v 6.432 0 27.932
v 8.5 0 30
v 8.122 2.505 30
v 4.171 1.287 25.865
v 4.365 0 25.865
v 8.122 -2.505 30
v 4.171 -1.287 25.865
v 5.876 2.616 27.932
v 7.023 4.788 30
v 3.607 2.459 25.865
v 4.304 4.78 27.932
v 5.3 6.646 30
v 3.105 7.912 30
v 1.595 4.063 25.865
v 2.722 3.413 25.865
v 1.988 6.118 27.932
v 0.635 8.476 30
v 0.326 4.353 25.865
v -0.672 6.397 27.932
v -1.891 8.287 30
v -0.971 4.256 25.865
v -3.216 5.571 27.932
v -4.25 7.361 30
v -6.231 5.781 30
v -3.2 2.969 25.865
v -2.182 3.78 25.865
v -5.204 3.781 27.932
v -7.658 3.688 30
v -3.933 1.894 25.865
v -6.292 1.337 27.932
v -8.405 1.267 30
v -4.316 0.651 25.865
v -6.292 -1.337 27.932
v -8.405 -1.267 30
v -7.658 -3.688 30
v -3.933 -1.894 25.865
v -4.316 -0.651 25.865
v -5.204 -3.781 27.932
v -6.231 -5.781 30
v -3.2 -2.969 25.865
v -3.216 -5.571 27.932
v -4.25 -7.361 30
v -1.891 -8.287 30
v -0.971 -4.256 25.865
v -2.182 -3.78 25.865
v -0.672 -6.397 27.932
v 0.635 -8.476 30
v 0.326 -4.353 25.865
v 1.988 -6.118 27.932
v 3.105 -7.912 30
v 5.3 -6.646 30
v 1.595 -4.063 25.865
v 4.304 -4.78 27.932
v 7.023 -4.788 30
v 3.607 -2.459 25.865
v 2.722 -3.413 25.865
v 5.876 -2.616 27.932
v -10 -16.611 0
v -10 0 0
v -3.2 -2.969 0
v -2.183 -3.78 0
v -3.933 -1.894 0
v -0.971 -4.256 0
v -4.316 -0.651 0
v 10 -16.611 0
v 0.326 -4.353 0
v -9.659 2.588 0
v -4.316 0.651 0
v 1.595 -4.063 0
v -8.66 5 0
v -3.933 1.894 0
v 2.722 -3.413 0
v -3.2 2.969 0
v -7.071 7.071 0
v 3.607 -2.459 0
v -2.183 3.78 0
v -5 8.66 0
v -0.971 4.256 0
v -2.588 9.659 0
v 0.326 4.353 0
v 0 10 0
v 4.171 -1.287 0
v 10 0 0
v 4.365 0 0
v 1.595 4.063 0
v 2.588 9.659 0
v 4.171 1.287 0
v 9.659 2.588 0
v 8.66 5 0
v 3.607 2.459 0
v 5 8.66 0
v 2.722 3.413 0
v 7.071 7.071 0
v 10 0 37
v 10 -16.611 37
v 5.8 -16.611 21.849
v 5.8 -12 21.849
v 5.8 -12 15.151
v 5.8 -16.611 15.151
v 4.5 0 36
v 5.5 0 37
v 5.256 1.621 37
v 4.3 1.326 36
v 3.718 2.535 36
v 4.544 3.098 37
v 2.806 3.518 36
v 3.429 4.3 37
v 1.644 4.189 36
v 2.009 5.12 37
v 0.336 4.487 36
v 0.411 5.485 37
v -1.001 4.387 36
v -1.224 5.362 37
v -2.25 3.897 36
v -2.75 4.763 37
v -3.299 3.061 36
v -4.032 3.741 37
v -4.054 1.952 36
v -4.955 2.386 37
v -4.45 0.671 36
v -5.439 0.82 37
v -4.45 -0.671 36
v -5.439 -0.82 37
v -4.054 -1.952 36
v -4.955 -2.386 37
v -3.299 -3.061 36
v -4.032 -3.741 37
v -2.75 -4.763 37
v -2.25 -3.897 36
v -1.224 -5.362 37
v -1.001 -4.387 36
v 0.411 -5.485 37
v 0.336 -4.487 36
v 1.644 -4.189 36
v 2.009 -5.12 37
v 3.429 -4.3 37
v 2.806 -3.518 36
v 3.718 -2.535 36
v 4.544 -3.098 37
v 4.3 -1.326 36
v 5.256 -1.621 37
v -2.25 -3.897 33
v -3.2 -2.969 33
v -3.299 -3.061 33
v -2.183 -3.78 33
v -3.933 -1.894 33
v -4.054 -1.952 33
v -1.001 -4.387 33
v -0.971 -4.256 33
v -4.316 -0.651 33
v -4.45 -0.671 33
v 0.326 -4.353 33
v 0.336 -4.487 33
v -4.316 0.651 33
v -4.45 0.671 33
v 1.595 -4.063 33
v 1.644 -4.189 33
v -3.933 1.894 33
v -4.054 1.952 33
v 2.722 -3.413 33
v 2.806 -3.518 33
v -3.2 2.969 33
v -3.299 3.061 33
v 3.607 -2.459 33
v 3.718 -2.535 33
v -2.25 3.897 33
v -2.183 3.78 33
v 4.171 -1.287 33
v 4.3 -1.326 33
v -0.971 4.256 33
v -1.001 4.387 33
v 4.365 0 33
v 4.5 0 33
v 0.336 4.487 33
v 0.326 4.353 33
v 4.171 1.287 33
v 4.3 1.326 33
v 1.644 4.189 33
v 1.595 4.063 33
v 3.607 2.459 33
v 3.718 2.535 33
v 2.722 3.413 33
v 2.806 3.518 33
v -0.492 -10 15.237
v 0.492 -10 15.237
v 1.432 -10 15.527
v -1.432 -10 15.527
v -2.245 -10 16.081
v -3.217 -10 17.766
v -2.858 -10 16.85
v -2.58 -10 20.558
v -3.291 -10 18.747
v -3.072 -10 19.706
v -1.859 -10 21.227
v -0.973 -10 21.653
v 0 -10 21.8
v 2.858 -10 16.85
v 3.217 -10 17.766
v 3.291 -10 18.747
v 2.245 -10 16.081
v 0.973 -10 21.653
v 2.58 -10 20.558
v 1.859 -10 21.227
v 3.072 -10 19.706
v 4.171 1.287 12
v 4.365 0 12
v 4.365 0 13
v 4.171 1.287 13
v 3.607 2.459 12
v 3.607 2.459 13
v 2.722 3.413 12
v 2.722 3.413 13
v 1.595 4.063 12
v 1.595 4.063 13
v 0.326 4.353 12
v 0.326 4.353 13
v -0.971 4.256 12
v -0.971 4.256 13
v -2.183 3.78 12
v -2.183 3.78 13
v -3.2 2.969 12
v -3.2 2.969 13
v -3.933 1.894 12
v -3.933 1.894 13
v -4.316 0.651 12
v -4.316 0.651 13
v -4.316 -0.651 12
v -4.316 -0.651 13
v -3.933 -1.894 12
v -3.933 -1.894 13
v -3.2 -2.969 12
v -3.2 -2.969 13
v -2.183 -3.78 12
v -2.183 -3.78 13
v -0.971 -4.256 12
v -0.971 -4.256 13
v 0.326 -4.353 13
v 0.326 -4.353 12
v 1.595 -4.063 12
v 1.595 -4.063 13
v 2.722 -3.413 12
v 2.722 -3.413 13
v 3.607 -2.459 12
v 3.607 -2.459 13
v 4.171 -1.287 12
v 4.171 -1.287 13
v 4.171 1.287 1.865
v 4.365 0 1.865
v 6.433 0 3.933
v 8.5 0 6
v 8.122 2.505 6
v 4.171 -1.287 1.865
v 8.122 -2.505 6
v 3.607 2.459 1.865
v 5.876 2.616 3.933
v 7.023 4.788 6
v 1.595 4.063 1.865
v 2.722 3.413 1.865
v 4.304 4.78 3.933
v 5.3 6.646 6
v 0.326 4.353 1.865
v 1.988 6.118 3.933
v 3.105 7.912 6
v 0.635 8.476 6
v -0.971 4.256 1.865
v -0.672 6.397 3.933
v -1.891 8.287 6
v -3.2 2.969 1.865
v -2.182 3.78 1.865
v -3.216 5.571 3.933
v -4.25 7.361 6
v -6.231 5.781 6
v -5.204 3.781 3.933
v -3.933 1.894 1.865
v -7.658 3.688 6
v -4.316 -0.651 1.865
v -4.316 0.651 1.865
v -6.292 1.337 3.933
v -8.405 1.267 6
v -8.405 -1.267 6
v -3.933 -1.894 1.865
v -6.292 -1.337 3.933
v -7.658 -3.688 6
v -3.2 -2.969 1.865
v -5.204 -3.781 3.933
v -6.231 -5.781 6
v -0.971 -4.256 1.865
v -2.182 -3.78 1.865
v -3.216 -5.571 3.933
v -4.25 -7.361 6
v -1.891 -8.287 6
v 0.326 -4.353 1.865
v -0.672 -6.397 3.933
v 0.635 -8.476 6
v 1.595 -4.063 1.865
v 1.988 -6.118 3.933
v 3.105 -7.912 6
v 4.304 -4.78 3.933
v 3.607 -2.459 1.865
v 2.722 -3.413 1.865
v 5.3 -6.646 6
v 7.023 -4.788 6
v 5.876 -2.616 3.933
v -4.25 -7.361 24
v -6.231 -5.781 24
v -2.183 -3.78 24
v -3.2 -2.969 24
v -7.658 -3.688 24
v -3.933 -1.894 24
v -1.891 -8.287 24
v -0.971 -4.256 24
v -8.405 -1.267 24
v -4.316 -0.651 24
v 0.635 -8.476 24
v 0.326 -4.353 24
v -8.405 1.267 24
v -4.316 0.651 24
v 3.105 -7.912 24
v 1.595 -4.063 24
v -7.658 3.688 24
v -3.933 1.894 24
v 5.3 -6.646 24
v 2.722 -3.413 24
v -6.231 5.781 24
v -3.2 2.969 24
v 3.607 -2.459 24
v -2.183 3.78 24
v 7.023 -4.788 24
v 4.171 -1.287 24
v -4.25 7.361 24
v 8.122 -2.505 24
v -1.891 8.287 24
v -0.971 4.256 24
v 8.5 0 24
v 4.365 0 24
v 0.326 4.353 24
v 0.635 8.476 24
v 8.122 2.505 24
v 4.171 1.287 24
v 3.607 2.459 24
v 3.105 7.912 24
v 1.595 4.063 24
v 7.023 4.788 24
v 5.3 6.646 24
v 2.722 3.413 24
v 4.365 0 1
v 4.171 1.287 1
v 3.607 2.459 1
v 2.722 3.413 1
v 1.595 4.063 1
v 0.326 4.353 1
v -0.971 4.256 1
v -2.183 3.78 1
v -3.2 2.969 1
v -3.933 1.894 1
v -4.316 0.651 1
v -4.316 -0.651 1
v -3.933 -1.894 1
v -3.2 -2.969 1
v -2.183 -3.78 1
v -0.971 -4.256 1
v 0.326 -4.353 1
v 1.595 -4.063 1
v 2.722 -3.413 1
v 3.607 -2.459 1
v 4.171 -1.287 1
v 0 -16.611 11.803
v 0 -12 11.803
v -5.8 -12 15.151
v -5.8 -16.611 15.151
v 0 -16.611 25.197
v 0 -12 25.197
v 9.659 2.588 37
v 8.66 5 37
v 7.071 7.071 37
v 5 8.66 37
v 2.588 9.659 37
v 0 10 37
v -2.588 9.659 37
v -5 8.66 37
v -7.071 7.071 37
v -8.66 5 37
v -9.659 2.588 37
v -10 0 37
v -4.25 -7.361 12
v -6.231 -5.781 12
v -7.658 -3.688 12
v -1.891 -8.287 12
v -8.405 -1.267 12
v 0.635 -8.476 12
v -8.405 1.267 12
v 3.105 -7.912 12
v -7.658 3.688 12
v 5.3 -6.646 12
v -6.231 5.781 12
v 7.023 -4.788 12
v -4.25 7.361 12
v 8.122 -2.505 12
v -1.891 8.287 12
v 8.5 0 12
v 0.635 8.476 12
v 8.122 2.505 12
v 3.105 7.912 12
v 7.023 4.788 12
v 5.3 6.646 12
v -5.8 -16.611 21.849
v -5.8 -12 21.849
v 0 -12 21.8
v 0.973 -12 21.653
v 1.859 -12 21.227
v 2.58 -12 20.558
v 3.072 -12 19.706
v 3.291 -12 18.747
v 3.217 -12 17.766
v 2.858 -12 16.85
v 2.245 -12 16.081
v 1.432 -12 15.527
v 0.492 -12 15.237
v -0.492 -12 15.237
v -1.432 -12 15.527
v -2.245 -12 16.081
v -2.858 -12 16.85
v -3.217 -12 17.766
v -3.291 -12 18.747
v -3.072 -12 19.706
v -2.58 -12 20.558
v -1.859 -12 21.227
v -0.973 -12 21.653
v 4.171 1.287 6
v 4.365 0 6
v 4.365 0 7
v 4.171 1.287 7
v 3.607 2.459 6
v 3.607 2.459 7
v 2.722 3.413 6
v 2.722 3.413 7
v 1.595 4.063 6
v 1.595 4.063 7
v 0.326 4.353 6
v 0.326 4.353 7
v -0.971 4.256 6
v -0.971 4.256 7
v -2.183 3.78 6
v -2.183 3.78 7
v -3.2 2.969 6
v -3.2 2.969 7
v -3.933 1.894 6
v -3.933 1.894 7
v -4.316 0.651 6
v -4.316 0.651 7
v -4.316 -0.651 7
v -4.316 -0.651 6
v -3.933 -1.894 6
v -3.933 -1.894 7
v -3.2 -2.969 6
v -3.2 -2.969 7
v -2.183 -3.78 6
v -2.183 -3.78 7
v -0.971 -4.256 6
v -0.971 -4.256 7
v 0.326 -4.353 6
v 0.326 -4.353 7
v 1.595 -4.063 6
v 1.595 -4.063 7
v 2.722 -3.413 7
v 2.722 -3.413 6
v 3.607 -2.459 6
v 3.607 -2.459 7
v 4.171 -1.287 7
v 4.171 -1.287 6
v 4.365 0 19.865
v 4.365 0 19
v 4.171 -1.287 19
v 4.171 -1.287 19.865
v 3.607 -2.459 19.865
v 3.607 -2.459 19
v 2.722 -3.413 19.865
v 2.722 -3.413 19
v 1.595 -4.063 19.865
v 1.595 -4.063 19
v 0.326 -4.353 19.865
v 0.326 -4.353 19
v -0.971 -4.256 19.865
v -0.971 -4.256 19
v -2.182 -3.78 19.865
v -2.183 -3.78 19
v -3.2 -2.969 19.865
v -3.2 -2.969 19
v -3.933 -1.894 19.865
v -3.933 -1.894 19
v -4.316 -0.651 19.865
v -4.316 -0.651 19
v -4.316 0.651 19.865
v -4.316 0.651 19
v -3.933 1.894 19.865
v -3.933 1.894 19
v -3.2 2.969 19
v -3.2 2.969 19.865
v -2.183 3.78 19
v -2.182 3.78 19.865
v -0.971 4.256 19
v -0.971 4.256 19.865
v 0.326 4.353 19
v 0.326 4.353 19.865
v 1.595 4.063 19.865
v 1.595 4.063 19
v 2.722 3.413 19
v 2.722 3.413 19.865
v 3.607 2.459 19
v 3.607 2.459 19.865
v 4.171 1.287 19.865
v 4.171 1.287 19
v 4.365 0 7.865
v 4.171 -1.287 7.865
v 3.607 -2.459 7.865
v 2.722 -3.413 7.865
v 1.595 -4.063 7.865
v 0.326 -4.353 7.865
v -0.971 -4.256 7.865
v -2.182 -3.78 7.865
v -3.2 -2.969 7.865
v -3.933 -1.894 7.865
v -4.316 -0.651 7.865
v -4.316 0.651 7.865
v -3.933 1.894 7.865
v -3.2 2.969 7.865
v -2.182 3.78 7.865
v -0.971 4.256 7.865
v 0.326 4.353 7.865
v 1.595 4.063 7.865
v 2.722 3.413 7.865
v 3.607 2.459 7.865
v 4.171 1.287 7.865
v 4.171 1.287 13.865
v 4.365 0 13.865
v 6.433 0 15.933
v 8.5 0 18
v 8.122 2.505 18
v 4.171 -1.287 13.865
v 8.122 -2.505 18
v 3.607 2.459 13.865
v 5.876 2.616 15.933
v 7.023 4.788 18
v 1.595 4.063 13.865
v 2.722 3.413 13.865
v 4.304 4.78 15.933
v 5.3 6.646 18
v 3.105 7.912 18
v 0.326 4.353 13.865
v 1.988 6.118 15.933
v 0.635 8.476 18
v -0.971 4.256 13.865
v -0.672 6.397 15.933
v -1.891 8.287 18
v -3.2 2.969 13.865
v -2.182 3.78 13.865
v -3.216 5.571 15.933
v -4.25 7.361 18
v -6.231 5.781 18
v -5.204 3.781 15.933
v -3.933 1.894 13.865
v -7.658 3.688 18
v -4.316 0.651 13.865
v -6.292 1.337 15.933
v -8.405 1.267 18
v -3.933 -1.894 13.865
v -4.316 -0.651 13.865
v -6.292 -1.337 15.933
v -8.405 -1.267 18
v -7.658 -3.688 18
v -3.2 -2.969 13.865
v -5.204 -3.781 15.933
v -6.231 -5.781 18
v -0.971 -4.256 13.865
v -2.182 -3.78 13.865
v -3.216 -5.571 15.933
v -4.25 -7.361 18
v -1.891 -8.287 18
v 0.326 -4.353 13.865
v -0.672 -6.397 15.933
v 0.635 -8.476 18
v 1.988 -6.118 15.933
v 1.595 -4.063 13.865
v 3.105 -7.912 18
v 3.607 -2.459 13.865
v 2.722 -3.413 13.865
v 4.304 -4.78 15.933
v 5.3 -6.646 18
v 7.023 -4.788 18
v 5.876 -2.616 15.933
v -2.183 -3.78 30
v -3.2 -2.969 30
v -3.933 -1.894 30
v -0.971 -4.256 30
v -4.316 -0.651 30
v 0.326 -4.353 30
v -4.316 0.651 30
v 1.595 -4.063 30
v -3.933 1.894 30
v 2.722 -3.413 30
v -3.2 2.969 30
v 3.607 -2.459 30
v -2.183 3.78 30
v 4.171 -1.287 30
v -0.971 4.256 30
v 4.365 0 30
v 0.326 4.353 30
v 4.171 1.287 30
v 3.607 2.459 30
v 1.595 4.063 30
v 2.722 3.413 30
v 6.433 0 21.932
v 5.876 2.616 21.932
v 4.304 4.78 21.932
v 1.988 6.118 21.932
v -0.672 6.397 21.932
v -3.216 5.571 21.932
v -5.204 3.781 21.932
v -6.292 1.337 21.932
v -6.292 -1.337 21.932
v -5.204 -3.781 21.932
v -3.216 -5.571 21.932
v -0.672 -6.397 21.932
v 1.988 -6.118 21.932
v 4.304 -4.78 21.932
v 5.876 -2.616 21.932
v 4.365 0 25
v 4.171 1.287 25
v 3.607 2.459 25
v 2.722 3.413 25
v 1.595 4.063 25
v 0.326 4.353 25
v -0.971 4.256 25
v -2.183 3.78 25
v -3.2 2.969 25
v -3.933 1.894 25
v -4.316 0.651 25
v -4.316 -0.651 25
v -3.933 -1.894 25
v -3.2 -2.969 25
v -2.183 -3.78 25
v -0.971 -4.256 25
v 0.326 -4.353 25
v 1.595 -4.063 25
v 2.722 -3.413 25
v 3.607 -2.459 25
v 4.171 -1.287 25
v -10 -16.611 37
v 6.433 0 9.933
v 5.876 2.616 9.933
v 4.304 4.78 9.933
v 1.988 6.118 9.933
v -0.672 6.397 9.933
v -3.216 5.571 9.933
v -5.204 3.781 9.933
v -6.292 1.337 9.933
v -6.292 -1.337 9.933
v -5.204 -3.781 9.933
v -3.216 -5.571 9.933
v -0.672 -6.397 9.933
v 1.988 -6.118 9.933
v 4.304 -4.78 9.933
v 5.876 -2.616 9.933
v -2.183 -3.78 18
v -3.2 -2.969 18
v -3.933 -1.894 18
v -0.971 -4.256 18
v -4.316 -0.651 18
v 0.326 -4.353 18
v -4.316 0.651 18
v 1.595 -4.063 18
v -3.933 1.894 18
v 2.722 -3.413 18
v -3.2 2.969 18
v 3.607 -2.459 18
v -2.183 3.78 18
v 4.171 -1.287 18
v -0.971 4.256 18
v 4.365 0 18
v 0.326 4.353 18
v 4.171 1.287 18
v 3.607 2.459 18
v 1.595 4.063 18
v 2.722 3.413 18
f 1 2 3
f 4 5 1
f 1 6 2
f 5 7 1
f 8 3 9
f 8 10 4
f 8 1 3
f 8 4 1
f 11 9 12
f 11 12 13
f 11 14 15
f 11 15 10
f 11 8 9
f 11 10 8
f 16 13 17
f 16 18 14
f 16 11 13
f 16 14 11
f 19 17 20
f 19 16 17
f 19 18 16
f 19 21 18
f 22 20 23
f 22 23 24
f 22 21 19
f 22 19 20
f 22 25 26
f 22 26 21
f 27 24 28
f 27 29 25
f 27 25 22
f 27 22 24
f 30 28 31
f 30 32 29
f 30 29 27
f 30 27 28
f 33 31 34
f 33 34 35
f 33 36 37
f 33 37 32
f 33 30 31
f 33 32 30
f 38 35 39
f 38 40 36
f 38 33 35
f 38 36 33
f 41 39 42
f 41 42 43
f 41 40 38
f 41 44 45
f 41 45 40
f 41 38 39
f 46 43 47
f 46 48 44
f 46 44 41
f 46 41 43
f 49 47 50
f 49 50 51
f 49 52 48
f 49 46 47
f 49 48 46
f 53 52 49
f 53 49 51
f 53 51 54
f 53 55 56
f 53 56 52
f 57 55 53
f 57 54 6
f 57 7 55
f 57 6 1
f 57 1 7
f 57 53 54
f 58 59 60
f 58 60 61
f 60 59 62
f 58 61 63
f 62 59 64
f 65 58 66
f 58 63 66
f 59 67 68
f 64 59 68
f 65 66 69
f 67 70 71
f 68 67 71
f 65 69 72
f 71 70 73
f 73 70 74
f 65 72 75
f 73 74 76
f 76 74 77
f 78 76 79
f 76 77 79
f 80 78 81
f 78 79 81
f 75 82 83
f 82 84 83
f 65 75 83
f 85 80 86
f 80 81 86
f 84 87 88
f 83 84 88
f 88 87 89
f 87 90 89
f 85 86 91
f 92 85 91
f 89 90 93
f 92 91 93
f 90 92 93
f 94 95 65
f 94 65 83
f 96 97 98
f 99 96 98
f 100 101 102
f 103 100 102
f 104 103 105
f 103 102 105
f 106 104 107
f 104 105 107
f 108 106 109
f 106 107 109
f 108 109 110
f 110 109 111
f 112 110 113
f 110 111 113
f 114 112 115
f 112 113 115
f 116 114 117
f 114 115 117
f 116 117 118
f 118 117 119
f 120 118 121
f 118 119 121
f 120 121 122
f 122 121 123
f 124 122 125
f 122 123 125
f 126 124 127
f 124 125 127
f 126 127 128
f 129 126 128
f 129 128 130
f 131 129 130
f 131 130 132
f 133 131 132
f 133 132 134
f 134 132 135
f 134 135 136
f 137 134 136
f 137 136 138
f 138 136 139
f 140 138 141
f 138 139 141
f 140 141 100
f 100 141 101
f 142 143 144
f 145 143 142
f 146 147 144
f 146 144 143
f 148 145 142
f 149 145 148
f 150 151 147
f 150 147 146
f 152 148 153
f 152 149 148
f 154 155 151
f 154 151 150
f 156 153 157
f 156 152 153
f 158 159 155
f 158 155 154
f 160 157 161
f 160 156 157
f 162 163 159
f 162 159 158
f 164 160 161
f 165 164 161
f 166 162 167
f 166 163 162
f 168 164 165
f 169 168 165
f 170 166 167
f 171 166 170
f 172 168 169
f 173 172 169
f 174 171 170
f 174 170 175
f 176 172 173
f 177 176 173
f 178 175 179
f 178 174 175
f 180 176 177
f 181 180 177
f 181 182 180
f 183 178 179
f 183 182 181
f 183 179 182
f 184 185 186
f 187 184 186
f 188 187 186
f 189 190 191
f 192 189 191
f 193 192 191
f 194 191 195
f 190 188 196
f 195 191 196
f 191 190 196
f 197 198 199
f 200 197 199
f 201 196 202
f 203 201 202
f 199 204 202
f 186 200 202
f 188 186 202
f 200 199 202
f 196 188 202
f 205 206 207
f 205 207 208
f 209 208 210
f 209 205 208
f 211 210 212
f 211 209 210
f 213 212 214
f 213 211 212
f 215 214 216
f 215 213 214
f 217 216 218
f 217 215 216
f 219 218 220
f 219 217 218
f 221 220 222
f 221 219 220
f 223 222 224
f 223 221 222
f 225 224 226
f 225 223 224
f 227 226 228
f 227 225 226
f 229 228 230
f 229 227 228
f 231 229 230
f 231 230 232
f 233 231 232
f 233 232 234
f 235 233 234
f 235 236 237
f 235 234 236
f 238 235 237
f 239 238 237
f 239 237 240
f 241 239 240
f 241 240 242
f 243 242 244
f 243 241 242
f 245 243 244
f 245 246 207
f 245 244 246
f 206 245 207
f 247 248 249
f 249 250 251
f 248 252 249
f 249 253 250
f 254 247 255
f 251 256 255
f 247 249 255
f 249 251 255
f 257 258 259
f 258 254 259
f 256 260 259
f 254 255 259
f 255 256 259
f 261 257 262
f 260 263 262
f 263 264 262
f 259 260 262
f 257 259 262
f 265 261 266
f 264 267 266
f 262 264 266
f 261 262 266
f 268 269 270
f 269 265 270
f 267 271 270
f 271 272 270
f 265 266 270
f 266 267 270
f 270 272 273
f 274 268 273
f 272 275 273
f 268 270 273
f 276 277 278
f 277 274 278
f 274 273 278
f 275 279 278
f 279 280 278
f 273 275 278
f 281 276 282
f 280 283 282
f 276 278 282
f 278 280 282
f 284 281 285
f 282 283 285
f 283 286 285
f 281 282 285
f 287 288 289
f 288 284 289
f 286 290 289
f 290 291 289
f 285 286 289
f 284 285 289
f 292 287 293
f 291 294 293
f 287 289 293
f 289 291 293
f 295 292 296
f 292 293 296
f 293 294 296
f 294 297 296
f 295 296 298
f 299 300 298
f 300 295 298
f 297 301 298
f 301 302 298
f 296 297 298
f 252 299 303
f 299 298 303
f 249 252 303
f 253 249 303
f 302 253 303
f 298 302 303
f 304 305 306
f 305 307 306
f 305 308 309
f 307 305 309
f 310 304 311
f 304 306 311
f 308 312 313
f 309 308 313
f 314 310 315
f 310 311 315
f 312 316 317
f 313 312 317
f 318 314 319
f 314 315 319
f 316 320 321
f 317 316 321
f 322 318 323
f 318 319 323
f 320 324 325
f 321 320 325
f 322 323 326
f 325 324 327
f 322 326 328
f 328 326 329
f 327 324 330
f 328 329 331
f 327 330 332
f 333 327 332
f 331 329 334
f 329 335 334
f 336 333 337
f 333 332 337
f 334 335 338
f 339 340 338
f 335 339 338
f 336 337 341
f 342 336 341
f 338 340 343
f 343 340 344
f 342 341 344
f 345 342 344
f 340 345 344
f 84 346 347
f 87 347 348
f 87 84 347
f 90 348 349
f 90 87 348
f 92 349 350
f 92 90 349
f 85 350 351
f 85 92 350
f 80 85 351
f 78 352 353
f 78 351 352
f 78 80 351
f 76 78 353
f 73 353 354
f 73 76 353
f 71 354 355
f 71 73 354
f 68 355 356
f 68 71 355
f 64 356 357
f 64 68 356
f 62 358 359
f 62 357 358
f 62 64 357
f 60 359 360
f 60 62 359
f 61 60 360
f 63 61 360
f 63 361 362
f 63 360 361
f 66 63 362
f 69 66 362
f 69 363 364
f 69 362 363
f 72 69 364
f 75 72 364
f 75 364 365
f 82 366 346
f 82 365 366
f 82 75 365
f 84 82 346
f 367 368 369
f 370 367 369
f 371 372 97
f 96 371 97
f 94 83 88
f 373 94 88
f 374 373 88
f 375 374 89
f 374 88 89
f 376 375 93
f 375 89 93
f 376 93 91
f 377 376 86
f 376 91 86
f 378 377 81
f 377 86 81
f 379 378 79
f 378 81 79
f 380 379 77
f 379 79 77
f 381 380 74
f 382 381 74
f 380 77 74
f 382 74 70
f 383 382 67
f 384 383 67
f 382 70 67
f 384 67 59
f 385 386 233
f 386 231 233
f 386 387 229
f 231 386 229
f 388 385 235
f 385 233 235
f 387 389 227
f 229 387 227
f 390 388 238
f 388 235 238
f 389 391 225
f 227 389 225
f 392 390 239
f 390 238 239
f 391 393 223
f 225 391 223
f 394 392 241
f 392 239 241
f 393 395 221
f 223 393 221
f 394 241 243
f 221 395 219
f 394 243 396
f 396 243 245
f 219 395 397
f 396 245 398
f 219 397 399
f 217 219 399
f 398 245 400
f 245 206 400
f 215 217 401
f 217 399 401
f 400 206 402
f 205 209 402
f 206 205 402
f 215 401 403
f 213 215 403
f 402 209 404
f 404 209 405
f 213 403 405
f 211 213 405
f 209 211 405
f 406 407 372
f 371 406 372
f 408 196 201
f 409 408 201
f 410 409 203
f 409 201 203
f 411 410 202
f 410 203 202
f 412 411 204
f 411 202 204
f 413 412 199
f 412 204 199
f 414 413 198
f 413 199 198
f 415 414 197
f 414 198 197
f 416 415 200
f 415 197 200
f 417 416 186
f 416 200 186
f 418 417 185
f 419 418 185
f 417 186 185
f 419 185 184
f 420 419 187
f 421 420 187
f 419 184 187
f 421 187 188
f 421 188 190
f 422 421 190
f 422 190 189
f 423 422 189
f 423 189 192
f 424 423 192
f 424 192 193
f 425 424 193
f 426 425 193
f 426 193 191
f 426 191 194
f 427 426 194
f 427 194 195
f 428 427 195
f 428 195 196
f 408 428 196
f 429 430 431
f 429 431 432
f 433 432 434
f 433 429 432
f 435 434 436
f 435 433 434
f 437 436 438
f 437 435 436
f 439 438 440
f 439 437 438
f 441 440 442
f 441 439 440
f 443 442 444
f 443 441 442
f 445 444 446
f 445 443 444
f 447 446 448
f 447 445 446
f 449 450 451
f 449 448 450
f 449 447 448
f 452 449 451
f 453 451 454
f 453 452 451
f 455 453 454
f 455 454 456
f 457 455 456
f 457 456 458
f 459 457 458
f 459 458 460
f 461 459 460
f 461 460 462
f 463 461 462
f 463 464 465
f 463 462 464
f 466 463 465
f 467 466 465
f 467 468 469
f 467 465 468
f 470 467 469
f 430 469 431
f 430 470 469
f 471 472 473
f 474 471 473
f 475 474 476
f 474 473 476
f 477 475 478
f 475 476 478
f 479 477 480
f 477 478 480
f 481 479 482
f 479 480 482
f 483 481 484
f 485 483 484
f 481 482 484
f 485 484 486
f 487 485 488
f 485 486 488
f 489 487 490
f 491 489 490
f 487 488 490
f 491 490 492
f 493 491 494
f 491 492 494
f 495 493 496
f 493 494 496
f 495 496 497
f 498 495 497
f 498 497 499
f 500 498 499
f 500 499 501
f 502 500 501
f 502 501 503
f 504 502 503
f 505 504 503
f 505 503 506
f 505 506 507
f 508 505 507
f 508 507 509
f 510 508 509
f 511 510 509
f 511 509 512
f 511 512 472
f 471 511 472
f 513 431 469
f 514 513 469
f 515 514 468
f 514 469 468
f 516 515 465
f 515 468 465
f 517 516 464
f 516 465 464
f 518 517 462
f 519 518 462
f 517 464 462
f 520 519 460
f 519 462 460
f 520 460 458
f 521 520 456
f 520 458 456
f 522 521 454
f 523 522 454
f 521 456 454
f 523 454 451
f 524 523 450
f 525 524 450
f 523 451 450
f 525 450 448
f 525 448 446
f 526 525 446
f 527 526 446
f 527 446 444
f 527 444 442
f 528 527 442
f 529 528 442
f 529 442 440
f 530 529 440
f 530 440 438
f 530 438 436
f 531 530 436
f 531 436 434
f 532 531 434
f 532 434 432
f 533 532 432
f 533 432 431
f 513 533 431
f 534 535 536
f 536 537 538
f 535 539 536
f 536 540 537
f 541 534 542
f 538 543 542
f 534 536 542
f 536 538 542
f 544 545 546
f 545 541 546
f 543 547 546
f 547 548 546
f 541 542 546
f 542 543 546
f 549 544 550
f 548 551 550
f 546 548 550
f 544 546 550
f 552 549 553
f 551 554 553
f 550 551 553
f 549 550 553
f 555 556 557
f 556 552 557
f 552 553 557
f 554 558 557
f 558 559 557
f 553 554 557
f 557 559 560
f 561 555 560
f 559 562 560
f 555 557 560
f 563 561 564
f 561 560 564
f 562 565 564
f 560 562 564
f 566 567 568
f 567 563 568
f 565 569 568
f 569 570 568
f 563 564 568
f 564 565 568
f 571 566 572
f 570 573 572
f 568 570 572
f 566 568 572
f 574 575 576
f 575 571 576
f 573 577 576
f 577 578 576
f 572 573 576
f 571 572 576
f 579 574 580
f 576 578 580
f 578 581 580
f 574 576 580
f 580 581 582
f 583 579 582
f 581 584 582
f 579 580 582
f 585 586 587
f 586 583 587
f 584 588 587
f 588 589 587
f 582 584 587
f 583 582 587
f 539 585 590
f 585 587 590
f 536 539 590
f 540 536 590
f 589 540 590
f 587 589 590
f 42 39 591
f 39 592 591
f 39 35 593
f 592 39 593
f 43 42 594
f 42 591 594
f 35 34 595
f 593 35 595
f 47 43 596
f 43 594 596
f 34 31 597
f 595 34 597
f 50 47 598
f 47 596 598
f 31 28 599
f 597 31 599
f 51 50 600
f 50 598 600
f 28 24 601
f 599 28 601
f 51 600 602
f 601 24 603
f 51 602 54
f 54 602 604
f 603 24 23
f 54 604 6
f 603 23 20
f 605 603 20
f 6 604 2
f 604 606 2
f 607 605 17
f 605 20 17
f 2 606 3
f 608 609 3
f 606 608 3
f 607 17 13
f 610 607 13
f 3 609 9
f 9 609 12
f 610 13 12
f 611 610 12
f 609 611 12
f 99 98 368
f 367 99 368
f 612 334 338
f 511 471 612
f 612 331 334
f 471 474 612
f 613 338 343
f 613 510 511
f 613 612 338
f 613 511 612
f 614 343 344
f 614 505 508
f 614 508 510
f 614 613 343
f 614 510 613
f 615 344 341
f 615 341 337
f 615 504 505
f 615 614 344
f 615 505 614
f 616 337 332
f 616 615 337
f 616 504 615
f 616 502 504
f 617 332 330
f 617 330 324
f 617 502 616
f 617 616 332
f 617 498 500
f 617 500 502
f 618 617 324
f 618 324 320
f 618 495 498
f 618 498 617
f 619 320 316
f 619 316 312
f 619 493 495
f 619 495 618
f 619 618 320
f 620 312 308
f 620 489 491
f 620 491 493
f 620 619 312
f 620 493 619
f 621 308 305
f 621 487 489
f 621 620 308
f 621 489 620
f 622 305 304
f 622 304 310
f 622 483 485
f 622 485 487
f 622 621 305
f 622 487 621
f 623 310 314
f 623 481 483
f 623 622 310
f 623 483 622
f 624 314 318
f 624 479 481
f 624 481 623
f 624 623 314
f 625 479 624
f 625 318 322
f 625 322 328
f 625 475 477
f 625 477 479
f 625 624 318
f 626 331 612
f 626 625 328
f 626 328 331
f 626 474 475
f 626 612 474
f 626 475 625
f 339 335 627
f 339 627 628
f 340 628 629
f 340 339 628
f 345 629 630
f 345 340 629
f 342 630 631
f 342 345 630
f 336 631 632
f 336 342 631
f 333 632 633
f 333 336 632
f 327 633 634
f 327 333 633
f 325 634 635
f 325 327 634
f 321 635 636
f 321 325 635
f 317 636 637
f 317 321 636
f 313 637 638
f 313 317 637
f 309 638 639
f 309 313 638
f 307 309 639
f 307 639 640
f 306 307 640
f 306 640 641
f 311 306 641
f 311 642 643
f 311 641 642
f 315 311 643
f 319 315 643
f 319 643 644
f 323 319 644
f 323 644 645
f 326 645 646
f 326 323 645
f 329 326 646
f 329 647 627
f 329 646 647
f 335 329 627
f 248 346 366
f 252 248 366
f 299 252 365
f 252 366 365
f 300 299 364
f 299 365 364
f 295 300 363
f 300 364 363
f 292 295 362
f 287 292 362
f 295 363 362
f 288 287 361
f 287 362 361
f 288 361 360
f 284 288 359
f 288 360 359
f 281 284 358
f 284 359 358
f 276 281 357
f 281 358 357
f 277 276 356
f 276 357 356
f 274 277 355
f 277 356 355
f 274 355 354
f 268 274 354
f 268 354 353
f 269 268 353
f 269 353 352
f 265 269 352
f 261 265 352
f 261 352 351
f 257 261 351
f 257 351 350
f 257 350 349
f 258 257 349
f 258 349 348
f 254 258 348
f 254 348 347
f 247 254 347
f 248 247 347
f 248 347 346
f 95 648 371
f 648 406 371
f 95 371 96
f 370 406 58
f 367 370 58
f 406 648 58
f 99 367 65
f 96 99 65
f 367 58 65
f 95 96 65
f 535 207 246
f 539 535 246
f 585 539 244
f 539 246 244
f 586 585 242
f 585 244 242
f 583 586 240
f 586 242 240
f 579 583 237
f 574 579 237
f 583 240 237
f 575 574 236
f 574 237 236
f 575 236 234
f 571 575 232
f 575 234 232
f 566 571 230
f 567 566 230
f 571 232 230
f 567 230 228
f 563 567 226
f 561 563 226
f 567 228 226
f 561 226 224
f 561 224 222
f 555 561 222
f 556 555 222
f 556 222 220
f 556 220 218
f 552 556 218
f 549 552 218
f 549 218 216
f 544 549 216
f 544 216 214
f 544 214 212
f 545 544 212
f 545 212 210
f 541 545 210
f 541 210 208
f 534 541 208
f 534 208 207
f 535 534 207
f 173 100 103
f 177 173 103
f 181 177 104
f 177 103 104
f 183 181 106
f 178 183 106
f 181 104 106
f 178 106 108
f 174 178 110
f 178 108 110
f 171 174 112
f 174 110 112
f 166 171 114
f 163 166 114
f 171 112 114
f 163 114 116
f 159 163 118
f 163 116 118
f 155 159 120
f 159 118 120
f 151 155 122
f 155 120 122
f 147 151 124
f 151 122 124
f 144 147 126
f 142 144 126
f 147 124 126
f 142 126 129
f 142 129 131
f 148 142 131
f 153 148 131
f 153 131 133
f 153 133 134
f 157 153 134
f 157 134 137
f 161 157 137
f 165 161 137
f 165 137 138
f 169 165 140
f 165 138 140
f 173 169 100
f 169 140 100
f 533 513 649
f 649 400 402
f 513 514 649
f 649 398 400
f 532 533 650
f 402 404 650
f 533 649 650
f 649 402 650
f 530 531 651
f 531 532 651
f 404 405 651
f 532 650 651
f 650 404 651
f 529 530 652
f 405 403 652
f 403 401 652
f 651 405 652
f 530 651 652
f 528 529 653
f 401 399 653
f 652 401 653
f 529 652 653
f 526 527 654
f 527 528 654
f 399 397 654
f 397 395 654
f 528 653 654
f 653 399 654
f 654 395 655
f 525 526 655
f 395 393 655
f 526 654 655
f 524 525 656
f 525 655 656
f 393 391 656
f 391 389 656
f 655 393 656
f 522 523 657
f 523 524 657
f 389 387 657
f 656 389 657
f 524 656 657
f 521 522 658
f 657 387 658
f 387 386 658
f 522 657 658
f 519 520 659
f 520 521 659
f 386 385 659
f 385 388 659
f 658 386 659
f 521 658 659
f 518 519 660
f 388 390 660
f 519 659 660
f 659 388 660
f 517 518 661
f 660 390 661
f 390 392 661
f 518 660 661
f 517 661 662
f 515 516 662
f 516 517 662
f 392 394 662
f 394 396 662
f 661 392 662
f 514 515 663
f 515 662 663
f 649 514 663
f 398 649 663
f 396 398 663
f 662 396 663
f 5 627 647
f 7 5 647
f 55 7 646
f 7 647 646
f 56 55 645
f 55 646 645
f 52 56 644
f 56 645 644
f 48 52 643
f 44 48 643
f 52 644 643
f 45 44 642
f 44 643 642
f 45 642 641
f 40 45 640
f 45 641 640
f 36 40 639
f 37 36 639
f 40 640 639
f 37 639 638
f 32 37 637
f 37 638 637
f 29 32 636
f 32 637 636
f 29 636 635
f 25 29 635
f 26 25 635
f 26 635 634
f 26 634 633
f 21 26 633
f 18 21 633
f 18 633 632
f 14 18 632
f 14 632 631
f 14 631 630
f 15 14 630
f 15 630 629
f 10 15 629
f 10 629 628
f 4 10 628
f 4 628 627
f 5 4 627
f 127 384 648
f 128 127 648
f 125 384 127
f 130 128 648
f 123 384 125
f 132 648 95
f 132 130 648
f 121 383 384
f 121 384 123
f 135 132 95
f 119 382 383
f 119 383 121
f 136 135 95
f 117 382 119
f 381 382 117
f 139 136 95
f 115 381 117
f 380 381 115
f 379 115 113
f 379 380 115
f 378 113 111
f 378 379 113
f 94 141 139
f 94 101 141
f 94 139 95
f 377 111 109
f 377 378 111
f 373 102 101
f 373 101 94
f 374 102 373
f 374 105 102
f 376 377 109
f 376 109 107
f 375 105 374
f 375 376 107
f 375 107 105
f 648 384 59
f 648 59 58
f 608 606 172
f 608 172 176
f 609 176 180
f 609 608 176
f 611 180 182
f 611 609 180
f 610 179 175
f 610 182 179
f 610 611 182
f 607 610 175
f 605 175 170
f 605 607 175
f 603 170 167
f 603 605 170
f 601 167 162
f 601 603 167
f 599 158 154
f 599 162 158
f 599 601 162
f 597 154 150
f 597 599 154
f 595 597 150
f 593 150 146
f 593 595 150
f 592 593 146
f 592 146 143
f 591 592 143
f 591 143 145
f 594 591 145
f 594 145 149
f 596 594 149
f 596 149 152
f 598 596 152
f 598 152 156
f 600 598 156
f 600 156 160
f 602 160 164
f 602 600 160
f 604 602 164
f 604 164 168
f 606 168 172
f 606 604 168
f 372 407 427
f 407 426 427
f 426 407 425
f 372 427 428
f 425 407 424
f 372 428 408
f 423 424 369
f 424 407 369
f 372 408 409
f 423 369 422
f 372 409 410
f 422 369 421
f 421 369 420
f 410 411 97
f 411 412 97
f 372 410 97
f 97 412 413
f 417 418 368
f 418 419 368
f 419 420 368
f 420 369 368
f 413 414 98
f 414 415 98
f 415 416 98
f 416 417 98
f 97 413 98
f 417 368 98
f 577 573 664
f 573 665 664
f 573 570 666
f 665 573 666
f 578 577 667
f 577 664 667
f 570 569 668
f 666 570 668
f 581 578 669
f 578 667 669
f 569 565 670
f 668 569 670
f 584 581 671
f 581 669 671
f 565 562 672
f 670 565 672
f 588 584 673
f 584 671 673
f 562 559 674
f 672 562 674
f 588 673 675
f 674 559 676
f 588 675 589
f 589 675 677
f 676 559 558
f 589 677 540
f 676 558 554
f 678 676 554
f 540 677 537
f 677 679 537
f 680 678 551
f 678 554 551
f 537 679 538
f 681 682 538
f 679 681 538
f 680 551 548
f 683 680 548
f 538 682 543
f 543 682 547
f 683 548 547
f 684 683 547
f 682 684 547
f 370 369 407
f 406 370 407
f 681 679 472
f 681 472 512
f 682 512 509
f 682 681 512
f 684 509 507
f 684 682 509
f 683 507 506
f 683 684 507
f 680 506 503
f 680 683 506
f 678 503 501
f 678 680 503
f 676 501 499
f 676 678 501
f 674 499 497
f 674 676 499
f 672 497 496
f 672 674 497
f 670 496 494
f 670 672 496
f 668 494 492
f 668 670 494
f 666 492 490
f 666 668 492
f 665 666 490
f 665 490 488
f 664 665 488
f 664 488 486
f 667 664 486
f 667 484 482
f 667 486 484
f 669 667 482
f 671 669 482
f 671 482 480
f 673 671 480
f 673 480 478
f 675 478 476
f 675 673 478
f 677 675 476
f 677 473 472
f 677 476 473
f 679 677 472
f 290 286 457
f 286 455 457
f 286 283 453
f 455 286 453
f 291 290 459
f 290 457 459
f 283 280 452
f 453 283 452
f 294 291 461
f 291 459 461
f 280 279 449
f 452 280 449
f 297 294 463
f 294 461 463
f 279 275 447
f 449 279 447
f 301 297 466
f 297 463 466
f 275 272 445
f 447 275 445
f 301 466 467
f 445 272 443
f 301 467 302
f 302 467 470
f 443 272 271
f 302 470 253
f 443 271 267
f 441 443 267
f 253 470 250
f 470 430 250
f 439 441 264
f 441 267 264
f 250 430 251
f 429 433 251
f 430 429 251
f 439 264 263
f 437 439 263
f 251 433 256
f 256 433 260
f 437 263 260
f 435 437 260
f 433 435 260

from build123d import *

# Parameters (mm, degrees)
CROQUIS1_R              = 10
CROQUIS1_R_2            = 4.365
SALIENTE_EXTRUIR1_DEPTH = 37
CORTAR_EXTRUIR1_START   = 1
CROQUIS1_3_R            = 8.5
CORTAR_EXTRUIR1_DEPTH   = 5
CORTAR_EXTRUIR2_START   = 7
CROQUIS1_4_R            = 8.5
CORTAR_EXTRUIR2_DEPTH   = 5
CORTAR_EXTRUIR3_START   = 13
CROQUIS1_5_R            = 8.5
CORTAR_EXTRUIR3_DEPTH   = 5
CORTAR_EXTRUIR4_START   = 19
CROQUIS1_6_R            = 8.5
CORTAR_EXTRUIR4_DEPTH   = 5
CORTAR_EXTRUIR5_START   = 25
CROQUIS1_7_R            = 8.5
CORTAR_EXTRUIR5_DEPTH   = 5
CHAFL_N1_SIZE           = 5
CORTAR_EXTRUIR6_START   = 37
CROQUIS4_R              = 4.5
CORTAR_EXTRUIR6_DEPTH   = 4
CHAFL_N2_SIZE           = 1
SALIENTE_EXTRUIR2_DEPTH = 37
CORTAR_EXTRUIR7_START   = -10
CROQUIS6_R              = 3.3
CORTAR_EXTRUIR7_DEPTH   = 116
CORTAR_EXTRUIR8_START   = -12
CORTAR_EXTRUIR8_DEPTH   = 5


with BuildPart() as part:
    # Croquis1 → Saliente-Extruir1 (new body)
    with BuildSketch(Plane.XY):
        Circle(CROQUIS1_R)
        Circle(CROQUIS1_R_2, mode=Mode.SUBTRACT)
    extrude(amount=SALIENTE_EXTRUIR1_DEPTH)

    # Croquis1<3> → Cortar-Extruir1 (cut)
    with BuildSketch(Plane.XY.offset(CORTAR_EXTRUIR1_START)):
        Circle(CROQUIS1_3_R)
    extrude(amount=CORTAR_EXTRUIR1_DEPTH, mode=Mode.SUBTRACT)

    # Croquis1<4> → Cortar-Extruir2 (cut)
    with BuildSketch(Plane.XY.offset(CORTAR_EXTRUIR2_START)):
        Circle(CROQUIS1_4_R)
    extrude(amount=CORTAR_EXTRUIR2_DEPTH, mode=Mode.SUBTRACT)

    # Croquis1<5> → Cortar-Extruir3 (cut)
    with BuildSketch(Plane.XY.offset(CORTAR_EXTRUIR3_START)):
        Circle(CROQUIS1_5_R)
    extrude(amount=CORTAR_EXTRUIR3_DEPTH, mode=Mode.SUBTRACT)

    # Croquis1<6> → Cortar-Extruir4 (cut)
    with BuildSketch(Plane.XY.offset(CORTAR_EXTRUIR4_START)):
        Circle(CROQUIS1_6_R)
    extrude(amount=CORTAR_EXTRUIR4_DEPTH, mode=Mode.SUBTRACT)

    # Croquis1<7> → Cortar-Extruir5 (cut)
    with BuildSketch(Plane.XY.offset(CORTAR_EXTRUIR5_START)):
        Circle(CROQUIS1_7_R)
    extrude(amount=CORTAR_EXTRUIR5_DEPTH, mode=Mode.SUBTRACT)

    # Chaflán1
    # the kernel refuses this chamfer: 5 mm, written as the material it adds along each edge
    with BuildSketch(Plane(origin=(0, 0, 13), x_dir=(1, 0, 0), z_dir=(0, -1, 0))) as chafl_n1_piece_1_section:
        Polygon((8.5 - CHAFL_N1_SIZE, 0), (8.5, CHAFL_N1_SIZE), (8.5, 0), align=None)
    chafl_n1_piece_1 = revolve(axis=Axis((0, 0, 13), (0, 0, 1)), mode=Mode.PRIVATE)
    chafl_n1_piece_1 = chafl_n1_piece_1 - Plane(origin=(0, 0, 15.944314862), x_dir=(1, 0, 0), z_dir=(0, 0, -1)) * Cylinder(4.365, 34, mode=Mode.PRIVATE)
    add(chafl_n1_piece_1)
    with BuildSketch(Plane(origin=(0, 0, 7), x_dir=(1, 0, 0), z_dir=(0, -1, 0))) as chafl_n1_piece_2_section:
        Polygon((8.5 - CHAFL_N1_SIZE, 0), (8.5, CHAFL_N1_SIZE), (8.5, 0), align=None)
    chafl_n1_piece_2 = revolve(axis=Axis((0, 0, 7), (0, 0, 1)), mode=Mode.PRIVATE)
    chafl_n1_piece_2 = chafl_n1_piece_2 - Plane(origin=(0, 0, 9.944314862), x_dir=(1, 0, 0), z_dir=(0, 0, -1)) * Cylinder(4.365, 34, mode=Mode.PRIVATE)
    add(chafl_n1_piece_2)
    with BuildSketch(Plane(origin=(0, 0, 1), x_dir=(1, 0, 0), z_dir=(0, -1, 0))) as chafl_n1_piece_3_section:
        Polygon((8.5 - CHAFL_N1_SIZE, 0), (8.5, CHAFL_N1_SIZE), (8.5, 0), align=None)
    chafl_n1_piece_3 = revolve(axis=Axis((0, 0, 1), (0, 0, 1)), mode=Mode.PRIVATE)
    chafl_n1_piece_3 = chafl_n1_piece_3 - Plane(origin=(0, 0, 3.944314862), x_dir=(1, 0, 0), z_dir=(0, 0, -1)) * Cylinder(4.365, 34, mode=Mode.PRIVATE)
    add(chafl_n1_piece_3)
    with BuildSketch(Plane(origin=(0, 0, 25), x_dir=(1, 0, 0), z_dir=(0, -1, 0))) as chafl_n1_piece_4_section:
        Polygon((8.5, CHAFL_N1_SIZE), (8.5 - CHAFL_N1_SIZE, 0), (8.5, 0), align=None)
    chafl_n1_piece_4 = revolve(axis=Axis((0, 0, 25), (0, 0, 1)), mode=Mode.PRIVATE)
    chafl_n1_piece_4 = chafl_n1_piece_4 - Plane(origin=(0, 0, 27.944314862), x_dir=(1, 0, 0), z_dir=(0, 0, -1)) * Cylinder(4.365, 34, mode=Mode.PRIVATE)
    add(chafl_n1_piece_4)
    with BuildSketch(Plane(origin=(0, 0, 19), x_dir=(1, 0, 0), z_dir=(0, -1, 0))) as chafl_n1_piece_5_section:
        Polygon((8.5, CHAFL_N1_SIZE), (8.5 - CHAFL_N1_SIZE, 0), (8.5, 0), align=None)
    chafl_n1_piece_5 = revolve(axis=Axis((0, 0, 19), (0, 0, 1)), mode=Mode.PRIVATE)
    chafl_n1_piece_5 = chafl_n1_piece_5 - Plane(origin=(0, 0, 21.944314862), x_dir=(1, 0, 0), z_dir=(0, 0, -1)) * Cylinder(4.365, 34, mode=Mode.PRIVATE)
    add(chafl_n1_piece_5)

    # Croquis4 → Cortar-Extruir6 (cut)
    with BuildSketch(Plane.XY.offset(CORTAR_EXTRUIR6_START)):
        Circle(CROQUIS4_R)
    extrude(amount=-CORTAR_EXTRUIR6_DEPTH, mode=Mode.SUBTRACT)

    # Chaflán2
    chafl_n2_edges = [part.edges().sort_by_distance(p)[0] for p in [
        (-4.5, 0, 37),
    ]]
    chamfer(chafl_n2_edges, length=CHAFL_N2_SIZE)

    # Croquis5 → Saliente-Extruir2 (add)
    with BuildSketch(Plane.XY):
        with BuildLine():
            Line((10, -16.611303619), (10, 0))
            ThreePointArc((10, 0), (0, -10), (-10, 0))
            Line((-10, 0), (-10, -16.611303619))
            Line((-10, -16.611303619), (10, -16.611303619))
        make_face()
    extrude(amount=SALIENTE_EXTRUIR2_DEPTH)

    # Croquis6 → Cortar-Extruir7 (cut)
    with BuildSketch(Plane(origin=(0, 0, 0), x_dir=(1, 0, 0), z_dir=(0, 1, 0)).offset(CORTAR_EXTRUIR7_START)):
        with Locations(Location((0, -18.5, 0), (0, 0, 270))):
            Circle(CROQUIS6_R)
    extrude(amount=-CORTAR_EXTRUIR7_DEPTH, mode=Mode.SUBTRACT)

    # Croquis6<3> → Cortar-Extruir8 (cut)
    with BuildSketch(Plane(origin=(0, 0, 0), x_dir=(1, 0, 0), z_dir=(0, 1, 0)).offset(CORTAR_EXTRUIR8_START)):
        Polygon((0, -25.197263123), (5.8, -21.848631561), (5.8, -15.151368439), (0, -11.802736877), (-5.8, -15.151368439), (-5.8, -21.848631561), align=None)
    extrude(amount=-CORTAR_EXTRUIR8_DEPTH, mode=Mode.SUBTRACT)


solid = part.part
